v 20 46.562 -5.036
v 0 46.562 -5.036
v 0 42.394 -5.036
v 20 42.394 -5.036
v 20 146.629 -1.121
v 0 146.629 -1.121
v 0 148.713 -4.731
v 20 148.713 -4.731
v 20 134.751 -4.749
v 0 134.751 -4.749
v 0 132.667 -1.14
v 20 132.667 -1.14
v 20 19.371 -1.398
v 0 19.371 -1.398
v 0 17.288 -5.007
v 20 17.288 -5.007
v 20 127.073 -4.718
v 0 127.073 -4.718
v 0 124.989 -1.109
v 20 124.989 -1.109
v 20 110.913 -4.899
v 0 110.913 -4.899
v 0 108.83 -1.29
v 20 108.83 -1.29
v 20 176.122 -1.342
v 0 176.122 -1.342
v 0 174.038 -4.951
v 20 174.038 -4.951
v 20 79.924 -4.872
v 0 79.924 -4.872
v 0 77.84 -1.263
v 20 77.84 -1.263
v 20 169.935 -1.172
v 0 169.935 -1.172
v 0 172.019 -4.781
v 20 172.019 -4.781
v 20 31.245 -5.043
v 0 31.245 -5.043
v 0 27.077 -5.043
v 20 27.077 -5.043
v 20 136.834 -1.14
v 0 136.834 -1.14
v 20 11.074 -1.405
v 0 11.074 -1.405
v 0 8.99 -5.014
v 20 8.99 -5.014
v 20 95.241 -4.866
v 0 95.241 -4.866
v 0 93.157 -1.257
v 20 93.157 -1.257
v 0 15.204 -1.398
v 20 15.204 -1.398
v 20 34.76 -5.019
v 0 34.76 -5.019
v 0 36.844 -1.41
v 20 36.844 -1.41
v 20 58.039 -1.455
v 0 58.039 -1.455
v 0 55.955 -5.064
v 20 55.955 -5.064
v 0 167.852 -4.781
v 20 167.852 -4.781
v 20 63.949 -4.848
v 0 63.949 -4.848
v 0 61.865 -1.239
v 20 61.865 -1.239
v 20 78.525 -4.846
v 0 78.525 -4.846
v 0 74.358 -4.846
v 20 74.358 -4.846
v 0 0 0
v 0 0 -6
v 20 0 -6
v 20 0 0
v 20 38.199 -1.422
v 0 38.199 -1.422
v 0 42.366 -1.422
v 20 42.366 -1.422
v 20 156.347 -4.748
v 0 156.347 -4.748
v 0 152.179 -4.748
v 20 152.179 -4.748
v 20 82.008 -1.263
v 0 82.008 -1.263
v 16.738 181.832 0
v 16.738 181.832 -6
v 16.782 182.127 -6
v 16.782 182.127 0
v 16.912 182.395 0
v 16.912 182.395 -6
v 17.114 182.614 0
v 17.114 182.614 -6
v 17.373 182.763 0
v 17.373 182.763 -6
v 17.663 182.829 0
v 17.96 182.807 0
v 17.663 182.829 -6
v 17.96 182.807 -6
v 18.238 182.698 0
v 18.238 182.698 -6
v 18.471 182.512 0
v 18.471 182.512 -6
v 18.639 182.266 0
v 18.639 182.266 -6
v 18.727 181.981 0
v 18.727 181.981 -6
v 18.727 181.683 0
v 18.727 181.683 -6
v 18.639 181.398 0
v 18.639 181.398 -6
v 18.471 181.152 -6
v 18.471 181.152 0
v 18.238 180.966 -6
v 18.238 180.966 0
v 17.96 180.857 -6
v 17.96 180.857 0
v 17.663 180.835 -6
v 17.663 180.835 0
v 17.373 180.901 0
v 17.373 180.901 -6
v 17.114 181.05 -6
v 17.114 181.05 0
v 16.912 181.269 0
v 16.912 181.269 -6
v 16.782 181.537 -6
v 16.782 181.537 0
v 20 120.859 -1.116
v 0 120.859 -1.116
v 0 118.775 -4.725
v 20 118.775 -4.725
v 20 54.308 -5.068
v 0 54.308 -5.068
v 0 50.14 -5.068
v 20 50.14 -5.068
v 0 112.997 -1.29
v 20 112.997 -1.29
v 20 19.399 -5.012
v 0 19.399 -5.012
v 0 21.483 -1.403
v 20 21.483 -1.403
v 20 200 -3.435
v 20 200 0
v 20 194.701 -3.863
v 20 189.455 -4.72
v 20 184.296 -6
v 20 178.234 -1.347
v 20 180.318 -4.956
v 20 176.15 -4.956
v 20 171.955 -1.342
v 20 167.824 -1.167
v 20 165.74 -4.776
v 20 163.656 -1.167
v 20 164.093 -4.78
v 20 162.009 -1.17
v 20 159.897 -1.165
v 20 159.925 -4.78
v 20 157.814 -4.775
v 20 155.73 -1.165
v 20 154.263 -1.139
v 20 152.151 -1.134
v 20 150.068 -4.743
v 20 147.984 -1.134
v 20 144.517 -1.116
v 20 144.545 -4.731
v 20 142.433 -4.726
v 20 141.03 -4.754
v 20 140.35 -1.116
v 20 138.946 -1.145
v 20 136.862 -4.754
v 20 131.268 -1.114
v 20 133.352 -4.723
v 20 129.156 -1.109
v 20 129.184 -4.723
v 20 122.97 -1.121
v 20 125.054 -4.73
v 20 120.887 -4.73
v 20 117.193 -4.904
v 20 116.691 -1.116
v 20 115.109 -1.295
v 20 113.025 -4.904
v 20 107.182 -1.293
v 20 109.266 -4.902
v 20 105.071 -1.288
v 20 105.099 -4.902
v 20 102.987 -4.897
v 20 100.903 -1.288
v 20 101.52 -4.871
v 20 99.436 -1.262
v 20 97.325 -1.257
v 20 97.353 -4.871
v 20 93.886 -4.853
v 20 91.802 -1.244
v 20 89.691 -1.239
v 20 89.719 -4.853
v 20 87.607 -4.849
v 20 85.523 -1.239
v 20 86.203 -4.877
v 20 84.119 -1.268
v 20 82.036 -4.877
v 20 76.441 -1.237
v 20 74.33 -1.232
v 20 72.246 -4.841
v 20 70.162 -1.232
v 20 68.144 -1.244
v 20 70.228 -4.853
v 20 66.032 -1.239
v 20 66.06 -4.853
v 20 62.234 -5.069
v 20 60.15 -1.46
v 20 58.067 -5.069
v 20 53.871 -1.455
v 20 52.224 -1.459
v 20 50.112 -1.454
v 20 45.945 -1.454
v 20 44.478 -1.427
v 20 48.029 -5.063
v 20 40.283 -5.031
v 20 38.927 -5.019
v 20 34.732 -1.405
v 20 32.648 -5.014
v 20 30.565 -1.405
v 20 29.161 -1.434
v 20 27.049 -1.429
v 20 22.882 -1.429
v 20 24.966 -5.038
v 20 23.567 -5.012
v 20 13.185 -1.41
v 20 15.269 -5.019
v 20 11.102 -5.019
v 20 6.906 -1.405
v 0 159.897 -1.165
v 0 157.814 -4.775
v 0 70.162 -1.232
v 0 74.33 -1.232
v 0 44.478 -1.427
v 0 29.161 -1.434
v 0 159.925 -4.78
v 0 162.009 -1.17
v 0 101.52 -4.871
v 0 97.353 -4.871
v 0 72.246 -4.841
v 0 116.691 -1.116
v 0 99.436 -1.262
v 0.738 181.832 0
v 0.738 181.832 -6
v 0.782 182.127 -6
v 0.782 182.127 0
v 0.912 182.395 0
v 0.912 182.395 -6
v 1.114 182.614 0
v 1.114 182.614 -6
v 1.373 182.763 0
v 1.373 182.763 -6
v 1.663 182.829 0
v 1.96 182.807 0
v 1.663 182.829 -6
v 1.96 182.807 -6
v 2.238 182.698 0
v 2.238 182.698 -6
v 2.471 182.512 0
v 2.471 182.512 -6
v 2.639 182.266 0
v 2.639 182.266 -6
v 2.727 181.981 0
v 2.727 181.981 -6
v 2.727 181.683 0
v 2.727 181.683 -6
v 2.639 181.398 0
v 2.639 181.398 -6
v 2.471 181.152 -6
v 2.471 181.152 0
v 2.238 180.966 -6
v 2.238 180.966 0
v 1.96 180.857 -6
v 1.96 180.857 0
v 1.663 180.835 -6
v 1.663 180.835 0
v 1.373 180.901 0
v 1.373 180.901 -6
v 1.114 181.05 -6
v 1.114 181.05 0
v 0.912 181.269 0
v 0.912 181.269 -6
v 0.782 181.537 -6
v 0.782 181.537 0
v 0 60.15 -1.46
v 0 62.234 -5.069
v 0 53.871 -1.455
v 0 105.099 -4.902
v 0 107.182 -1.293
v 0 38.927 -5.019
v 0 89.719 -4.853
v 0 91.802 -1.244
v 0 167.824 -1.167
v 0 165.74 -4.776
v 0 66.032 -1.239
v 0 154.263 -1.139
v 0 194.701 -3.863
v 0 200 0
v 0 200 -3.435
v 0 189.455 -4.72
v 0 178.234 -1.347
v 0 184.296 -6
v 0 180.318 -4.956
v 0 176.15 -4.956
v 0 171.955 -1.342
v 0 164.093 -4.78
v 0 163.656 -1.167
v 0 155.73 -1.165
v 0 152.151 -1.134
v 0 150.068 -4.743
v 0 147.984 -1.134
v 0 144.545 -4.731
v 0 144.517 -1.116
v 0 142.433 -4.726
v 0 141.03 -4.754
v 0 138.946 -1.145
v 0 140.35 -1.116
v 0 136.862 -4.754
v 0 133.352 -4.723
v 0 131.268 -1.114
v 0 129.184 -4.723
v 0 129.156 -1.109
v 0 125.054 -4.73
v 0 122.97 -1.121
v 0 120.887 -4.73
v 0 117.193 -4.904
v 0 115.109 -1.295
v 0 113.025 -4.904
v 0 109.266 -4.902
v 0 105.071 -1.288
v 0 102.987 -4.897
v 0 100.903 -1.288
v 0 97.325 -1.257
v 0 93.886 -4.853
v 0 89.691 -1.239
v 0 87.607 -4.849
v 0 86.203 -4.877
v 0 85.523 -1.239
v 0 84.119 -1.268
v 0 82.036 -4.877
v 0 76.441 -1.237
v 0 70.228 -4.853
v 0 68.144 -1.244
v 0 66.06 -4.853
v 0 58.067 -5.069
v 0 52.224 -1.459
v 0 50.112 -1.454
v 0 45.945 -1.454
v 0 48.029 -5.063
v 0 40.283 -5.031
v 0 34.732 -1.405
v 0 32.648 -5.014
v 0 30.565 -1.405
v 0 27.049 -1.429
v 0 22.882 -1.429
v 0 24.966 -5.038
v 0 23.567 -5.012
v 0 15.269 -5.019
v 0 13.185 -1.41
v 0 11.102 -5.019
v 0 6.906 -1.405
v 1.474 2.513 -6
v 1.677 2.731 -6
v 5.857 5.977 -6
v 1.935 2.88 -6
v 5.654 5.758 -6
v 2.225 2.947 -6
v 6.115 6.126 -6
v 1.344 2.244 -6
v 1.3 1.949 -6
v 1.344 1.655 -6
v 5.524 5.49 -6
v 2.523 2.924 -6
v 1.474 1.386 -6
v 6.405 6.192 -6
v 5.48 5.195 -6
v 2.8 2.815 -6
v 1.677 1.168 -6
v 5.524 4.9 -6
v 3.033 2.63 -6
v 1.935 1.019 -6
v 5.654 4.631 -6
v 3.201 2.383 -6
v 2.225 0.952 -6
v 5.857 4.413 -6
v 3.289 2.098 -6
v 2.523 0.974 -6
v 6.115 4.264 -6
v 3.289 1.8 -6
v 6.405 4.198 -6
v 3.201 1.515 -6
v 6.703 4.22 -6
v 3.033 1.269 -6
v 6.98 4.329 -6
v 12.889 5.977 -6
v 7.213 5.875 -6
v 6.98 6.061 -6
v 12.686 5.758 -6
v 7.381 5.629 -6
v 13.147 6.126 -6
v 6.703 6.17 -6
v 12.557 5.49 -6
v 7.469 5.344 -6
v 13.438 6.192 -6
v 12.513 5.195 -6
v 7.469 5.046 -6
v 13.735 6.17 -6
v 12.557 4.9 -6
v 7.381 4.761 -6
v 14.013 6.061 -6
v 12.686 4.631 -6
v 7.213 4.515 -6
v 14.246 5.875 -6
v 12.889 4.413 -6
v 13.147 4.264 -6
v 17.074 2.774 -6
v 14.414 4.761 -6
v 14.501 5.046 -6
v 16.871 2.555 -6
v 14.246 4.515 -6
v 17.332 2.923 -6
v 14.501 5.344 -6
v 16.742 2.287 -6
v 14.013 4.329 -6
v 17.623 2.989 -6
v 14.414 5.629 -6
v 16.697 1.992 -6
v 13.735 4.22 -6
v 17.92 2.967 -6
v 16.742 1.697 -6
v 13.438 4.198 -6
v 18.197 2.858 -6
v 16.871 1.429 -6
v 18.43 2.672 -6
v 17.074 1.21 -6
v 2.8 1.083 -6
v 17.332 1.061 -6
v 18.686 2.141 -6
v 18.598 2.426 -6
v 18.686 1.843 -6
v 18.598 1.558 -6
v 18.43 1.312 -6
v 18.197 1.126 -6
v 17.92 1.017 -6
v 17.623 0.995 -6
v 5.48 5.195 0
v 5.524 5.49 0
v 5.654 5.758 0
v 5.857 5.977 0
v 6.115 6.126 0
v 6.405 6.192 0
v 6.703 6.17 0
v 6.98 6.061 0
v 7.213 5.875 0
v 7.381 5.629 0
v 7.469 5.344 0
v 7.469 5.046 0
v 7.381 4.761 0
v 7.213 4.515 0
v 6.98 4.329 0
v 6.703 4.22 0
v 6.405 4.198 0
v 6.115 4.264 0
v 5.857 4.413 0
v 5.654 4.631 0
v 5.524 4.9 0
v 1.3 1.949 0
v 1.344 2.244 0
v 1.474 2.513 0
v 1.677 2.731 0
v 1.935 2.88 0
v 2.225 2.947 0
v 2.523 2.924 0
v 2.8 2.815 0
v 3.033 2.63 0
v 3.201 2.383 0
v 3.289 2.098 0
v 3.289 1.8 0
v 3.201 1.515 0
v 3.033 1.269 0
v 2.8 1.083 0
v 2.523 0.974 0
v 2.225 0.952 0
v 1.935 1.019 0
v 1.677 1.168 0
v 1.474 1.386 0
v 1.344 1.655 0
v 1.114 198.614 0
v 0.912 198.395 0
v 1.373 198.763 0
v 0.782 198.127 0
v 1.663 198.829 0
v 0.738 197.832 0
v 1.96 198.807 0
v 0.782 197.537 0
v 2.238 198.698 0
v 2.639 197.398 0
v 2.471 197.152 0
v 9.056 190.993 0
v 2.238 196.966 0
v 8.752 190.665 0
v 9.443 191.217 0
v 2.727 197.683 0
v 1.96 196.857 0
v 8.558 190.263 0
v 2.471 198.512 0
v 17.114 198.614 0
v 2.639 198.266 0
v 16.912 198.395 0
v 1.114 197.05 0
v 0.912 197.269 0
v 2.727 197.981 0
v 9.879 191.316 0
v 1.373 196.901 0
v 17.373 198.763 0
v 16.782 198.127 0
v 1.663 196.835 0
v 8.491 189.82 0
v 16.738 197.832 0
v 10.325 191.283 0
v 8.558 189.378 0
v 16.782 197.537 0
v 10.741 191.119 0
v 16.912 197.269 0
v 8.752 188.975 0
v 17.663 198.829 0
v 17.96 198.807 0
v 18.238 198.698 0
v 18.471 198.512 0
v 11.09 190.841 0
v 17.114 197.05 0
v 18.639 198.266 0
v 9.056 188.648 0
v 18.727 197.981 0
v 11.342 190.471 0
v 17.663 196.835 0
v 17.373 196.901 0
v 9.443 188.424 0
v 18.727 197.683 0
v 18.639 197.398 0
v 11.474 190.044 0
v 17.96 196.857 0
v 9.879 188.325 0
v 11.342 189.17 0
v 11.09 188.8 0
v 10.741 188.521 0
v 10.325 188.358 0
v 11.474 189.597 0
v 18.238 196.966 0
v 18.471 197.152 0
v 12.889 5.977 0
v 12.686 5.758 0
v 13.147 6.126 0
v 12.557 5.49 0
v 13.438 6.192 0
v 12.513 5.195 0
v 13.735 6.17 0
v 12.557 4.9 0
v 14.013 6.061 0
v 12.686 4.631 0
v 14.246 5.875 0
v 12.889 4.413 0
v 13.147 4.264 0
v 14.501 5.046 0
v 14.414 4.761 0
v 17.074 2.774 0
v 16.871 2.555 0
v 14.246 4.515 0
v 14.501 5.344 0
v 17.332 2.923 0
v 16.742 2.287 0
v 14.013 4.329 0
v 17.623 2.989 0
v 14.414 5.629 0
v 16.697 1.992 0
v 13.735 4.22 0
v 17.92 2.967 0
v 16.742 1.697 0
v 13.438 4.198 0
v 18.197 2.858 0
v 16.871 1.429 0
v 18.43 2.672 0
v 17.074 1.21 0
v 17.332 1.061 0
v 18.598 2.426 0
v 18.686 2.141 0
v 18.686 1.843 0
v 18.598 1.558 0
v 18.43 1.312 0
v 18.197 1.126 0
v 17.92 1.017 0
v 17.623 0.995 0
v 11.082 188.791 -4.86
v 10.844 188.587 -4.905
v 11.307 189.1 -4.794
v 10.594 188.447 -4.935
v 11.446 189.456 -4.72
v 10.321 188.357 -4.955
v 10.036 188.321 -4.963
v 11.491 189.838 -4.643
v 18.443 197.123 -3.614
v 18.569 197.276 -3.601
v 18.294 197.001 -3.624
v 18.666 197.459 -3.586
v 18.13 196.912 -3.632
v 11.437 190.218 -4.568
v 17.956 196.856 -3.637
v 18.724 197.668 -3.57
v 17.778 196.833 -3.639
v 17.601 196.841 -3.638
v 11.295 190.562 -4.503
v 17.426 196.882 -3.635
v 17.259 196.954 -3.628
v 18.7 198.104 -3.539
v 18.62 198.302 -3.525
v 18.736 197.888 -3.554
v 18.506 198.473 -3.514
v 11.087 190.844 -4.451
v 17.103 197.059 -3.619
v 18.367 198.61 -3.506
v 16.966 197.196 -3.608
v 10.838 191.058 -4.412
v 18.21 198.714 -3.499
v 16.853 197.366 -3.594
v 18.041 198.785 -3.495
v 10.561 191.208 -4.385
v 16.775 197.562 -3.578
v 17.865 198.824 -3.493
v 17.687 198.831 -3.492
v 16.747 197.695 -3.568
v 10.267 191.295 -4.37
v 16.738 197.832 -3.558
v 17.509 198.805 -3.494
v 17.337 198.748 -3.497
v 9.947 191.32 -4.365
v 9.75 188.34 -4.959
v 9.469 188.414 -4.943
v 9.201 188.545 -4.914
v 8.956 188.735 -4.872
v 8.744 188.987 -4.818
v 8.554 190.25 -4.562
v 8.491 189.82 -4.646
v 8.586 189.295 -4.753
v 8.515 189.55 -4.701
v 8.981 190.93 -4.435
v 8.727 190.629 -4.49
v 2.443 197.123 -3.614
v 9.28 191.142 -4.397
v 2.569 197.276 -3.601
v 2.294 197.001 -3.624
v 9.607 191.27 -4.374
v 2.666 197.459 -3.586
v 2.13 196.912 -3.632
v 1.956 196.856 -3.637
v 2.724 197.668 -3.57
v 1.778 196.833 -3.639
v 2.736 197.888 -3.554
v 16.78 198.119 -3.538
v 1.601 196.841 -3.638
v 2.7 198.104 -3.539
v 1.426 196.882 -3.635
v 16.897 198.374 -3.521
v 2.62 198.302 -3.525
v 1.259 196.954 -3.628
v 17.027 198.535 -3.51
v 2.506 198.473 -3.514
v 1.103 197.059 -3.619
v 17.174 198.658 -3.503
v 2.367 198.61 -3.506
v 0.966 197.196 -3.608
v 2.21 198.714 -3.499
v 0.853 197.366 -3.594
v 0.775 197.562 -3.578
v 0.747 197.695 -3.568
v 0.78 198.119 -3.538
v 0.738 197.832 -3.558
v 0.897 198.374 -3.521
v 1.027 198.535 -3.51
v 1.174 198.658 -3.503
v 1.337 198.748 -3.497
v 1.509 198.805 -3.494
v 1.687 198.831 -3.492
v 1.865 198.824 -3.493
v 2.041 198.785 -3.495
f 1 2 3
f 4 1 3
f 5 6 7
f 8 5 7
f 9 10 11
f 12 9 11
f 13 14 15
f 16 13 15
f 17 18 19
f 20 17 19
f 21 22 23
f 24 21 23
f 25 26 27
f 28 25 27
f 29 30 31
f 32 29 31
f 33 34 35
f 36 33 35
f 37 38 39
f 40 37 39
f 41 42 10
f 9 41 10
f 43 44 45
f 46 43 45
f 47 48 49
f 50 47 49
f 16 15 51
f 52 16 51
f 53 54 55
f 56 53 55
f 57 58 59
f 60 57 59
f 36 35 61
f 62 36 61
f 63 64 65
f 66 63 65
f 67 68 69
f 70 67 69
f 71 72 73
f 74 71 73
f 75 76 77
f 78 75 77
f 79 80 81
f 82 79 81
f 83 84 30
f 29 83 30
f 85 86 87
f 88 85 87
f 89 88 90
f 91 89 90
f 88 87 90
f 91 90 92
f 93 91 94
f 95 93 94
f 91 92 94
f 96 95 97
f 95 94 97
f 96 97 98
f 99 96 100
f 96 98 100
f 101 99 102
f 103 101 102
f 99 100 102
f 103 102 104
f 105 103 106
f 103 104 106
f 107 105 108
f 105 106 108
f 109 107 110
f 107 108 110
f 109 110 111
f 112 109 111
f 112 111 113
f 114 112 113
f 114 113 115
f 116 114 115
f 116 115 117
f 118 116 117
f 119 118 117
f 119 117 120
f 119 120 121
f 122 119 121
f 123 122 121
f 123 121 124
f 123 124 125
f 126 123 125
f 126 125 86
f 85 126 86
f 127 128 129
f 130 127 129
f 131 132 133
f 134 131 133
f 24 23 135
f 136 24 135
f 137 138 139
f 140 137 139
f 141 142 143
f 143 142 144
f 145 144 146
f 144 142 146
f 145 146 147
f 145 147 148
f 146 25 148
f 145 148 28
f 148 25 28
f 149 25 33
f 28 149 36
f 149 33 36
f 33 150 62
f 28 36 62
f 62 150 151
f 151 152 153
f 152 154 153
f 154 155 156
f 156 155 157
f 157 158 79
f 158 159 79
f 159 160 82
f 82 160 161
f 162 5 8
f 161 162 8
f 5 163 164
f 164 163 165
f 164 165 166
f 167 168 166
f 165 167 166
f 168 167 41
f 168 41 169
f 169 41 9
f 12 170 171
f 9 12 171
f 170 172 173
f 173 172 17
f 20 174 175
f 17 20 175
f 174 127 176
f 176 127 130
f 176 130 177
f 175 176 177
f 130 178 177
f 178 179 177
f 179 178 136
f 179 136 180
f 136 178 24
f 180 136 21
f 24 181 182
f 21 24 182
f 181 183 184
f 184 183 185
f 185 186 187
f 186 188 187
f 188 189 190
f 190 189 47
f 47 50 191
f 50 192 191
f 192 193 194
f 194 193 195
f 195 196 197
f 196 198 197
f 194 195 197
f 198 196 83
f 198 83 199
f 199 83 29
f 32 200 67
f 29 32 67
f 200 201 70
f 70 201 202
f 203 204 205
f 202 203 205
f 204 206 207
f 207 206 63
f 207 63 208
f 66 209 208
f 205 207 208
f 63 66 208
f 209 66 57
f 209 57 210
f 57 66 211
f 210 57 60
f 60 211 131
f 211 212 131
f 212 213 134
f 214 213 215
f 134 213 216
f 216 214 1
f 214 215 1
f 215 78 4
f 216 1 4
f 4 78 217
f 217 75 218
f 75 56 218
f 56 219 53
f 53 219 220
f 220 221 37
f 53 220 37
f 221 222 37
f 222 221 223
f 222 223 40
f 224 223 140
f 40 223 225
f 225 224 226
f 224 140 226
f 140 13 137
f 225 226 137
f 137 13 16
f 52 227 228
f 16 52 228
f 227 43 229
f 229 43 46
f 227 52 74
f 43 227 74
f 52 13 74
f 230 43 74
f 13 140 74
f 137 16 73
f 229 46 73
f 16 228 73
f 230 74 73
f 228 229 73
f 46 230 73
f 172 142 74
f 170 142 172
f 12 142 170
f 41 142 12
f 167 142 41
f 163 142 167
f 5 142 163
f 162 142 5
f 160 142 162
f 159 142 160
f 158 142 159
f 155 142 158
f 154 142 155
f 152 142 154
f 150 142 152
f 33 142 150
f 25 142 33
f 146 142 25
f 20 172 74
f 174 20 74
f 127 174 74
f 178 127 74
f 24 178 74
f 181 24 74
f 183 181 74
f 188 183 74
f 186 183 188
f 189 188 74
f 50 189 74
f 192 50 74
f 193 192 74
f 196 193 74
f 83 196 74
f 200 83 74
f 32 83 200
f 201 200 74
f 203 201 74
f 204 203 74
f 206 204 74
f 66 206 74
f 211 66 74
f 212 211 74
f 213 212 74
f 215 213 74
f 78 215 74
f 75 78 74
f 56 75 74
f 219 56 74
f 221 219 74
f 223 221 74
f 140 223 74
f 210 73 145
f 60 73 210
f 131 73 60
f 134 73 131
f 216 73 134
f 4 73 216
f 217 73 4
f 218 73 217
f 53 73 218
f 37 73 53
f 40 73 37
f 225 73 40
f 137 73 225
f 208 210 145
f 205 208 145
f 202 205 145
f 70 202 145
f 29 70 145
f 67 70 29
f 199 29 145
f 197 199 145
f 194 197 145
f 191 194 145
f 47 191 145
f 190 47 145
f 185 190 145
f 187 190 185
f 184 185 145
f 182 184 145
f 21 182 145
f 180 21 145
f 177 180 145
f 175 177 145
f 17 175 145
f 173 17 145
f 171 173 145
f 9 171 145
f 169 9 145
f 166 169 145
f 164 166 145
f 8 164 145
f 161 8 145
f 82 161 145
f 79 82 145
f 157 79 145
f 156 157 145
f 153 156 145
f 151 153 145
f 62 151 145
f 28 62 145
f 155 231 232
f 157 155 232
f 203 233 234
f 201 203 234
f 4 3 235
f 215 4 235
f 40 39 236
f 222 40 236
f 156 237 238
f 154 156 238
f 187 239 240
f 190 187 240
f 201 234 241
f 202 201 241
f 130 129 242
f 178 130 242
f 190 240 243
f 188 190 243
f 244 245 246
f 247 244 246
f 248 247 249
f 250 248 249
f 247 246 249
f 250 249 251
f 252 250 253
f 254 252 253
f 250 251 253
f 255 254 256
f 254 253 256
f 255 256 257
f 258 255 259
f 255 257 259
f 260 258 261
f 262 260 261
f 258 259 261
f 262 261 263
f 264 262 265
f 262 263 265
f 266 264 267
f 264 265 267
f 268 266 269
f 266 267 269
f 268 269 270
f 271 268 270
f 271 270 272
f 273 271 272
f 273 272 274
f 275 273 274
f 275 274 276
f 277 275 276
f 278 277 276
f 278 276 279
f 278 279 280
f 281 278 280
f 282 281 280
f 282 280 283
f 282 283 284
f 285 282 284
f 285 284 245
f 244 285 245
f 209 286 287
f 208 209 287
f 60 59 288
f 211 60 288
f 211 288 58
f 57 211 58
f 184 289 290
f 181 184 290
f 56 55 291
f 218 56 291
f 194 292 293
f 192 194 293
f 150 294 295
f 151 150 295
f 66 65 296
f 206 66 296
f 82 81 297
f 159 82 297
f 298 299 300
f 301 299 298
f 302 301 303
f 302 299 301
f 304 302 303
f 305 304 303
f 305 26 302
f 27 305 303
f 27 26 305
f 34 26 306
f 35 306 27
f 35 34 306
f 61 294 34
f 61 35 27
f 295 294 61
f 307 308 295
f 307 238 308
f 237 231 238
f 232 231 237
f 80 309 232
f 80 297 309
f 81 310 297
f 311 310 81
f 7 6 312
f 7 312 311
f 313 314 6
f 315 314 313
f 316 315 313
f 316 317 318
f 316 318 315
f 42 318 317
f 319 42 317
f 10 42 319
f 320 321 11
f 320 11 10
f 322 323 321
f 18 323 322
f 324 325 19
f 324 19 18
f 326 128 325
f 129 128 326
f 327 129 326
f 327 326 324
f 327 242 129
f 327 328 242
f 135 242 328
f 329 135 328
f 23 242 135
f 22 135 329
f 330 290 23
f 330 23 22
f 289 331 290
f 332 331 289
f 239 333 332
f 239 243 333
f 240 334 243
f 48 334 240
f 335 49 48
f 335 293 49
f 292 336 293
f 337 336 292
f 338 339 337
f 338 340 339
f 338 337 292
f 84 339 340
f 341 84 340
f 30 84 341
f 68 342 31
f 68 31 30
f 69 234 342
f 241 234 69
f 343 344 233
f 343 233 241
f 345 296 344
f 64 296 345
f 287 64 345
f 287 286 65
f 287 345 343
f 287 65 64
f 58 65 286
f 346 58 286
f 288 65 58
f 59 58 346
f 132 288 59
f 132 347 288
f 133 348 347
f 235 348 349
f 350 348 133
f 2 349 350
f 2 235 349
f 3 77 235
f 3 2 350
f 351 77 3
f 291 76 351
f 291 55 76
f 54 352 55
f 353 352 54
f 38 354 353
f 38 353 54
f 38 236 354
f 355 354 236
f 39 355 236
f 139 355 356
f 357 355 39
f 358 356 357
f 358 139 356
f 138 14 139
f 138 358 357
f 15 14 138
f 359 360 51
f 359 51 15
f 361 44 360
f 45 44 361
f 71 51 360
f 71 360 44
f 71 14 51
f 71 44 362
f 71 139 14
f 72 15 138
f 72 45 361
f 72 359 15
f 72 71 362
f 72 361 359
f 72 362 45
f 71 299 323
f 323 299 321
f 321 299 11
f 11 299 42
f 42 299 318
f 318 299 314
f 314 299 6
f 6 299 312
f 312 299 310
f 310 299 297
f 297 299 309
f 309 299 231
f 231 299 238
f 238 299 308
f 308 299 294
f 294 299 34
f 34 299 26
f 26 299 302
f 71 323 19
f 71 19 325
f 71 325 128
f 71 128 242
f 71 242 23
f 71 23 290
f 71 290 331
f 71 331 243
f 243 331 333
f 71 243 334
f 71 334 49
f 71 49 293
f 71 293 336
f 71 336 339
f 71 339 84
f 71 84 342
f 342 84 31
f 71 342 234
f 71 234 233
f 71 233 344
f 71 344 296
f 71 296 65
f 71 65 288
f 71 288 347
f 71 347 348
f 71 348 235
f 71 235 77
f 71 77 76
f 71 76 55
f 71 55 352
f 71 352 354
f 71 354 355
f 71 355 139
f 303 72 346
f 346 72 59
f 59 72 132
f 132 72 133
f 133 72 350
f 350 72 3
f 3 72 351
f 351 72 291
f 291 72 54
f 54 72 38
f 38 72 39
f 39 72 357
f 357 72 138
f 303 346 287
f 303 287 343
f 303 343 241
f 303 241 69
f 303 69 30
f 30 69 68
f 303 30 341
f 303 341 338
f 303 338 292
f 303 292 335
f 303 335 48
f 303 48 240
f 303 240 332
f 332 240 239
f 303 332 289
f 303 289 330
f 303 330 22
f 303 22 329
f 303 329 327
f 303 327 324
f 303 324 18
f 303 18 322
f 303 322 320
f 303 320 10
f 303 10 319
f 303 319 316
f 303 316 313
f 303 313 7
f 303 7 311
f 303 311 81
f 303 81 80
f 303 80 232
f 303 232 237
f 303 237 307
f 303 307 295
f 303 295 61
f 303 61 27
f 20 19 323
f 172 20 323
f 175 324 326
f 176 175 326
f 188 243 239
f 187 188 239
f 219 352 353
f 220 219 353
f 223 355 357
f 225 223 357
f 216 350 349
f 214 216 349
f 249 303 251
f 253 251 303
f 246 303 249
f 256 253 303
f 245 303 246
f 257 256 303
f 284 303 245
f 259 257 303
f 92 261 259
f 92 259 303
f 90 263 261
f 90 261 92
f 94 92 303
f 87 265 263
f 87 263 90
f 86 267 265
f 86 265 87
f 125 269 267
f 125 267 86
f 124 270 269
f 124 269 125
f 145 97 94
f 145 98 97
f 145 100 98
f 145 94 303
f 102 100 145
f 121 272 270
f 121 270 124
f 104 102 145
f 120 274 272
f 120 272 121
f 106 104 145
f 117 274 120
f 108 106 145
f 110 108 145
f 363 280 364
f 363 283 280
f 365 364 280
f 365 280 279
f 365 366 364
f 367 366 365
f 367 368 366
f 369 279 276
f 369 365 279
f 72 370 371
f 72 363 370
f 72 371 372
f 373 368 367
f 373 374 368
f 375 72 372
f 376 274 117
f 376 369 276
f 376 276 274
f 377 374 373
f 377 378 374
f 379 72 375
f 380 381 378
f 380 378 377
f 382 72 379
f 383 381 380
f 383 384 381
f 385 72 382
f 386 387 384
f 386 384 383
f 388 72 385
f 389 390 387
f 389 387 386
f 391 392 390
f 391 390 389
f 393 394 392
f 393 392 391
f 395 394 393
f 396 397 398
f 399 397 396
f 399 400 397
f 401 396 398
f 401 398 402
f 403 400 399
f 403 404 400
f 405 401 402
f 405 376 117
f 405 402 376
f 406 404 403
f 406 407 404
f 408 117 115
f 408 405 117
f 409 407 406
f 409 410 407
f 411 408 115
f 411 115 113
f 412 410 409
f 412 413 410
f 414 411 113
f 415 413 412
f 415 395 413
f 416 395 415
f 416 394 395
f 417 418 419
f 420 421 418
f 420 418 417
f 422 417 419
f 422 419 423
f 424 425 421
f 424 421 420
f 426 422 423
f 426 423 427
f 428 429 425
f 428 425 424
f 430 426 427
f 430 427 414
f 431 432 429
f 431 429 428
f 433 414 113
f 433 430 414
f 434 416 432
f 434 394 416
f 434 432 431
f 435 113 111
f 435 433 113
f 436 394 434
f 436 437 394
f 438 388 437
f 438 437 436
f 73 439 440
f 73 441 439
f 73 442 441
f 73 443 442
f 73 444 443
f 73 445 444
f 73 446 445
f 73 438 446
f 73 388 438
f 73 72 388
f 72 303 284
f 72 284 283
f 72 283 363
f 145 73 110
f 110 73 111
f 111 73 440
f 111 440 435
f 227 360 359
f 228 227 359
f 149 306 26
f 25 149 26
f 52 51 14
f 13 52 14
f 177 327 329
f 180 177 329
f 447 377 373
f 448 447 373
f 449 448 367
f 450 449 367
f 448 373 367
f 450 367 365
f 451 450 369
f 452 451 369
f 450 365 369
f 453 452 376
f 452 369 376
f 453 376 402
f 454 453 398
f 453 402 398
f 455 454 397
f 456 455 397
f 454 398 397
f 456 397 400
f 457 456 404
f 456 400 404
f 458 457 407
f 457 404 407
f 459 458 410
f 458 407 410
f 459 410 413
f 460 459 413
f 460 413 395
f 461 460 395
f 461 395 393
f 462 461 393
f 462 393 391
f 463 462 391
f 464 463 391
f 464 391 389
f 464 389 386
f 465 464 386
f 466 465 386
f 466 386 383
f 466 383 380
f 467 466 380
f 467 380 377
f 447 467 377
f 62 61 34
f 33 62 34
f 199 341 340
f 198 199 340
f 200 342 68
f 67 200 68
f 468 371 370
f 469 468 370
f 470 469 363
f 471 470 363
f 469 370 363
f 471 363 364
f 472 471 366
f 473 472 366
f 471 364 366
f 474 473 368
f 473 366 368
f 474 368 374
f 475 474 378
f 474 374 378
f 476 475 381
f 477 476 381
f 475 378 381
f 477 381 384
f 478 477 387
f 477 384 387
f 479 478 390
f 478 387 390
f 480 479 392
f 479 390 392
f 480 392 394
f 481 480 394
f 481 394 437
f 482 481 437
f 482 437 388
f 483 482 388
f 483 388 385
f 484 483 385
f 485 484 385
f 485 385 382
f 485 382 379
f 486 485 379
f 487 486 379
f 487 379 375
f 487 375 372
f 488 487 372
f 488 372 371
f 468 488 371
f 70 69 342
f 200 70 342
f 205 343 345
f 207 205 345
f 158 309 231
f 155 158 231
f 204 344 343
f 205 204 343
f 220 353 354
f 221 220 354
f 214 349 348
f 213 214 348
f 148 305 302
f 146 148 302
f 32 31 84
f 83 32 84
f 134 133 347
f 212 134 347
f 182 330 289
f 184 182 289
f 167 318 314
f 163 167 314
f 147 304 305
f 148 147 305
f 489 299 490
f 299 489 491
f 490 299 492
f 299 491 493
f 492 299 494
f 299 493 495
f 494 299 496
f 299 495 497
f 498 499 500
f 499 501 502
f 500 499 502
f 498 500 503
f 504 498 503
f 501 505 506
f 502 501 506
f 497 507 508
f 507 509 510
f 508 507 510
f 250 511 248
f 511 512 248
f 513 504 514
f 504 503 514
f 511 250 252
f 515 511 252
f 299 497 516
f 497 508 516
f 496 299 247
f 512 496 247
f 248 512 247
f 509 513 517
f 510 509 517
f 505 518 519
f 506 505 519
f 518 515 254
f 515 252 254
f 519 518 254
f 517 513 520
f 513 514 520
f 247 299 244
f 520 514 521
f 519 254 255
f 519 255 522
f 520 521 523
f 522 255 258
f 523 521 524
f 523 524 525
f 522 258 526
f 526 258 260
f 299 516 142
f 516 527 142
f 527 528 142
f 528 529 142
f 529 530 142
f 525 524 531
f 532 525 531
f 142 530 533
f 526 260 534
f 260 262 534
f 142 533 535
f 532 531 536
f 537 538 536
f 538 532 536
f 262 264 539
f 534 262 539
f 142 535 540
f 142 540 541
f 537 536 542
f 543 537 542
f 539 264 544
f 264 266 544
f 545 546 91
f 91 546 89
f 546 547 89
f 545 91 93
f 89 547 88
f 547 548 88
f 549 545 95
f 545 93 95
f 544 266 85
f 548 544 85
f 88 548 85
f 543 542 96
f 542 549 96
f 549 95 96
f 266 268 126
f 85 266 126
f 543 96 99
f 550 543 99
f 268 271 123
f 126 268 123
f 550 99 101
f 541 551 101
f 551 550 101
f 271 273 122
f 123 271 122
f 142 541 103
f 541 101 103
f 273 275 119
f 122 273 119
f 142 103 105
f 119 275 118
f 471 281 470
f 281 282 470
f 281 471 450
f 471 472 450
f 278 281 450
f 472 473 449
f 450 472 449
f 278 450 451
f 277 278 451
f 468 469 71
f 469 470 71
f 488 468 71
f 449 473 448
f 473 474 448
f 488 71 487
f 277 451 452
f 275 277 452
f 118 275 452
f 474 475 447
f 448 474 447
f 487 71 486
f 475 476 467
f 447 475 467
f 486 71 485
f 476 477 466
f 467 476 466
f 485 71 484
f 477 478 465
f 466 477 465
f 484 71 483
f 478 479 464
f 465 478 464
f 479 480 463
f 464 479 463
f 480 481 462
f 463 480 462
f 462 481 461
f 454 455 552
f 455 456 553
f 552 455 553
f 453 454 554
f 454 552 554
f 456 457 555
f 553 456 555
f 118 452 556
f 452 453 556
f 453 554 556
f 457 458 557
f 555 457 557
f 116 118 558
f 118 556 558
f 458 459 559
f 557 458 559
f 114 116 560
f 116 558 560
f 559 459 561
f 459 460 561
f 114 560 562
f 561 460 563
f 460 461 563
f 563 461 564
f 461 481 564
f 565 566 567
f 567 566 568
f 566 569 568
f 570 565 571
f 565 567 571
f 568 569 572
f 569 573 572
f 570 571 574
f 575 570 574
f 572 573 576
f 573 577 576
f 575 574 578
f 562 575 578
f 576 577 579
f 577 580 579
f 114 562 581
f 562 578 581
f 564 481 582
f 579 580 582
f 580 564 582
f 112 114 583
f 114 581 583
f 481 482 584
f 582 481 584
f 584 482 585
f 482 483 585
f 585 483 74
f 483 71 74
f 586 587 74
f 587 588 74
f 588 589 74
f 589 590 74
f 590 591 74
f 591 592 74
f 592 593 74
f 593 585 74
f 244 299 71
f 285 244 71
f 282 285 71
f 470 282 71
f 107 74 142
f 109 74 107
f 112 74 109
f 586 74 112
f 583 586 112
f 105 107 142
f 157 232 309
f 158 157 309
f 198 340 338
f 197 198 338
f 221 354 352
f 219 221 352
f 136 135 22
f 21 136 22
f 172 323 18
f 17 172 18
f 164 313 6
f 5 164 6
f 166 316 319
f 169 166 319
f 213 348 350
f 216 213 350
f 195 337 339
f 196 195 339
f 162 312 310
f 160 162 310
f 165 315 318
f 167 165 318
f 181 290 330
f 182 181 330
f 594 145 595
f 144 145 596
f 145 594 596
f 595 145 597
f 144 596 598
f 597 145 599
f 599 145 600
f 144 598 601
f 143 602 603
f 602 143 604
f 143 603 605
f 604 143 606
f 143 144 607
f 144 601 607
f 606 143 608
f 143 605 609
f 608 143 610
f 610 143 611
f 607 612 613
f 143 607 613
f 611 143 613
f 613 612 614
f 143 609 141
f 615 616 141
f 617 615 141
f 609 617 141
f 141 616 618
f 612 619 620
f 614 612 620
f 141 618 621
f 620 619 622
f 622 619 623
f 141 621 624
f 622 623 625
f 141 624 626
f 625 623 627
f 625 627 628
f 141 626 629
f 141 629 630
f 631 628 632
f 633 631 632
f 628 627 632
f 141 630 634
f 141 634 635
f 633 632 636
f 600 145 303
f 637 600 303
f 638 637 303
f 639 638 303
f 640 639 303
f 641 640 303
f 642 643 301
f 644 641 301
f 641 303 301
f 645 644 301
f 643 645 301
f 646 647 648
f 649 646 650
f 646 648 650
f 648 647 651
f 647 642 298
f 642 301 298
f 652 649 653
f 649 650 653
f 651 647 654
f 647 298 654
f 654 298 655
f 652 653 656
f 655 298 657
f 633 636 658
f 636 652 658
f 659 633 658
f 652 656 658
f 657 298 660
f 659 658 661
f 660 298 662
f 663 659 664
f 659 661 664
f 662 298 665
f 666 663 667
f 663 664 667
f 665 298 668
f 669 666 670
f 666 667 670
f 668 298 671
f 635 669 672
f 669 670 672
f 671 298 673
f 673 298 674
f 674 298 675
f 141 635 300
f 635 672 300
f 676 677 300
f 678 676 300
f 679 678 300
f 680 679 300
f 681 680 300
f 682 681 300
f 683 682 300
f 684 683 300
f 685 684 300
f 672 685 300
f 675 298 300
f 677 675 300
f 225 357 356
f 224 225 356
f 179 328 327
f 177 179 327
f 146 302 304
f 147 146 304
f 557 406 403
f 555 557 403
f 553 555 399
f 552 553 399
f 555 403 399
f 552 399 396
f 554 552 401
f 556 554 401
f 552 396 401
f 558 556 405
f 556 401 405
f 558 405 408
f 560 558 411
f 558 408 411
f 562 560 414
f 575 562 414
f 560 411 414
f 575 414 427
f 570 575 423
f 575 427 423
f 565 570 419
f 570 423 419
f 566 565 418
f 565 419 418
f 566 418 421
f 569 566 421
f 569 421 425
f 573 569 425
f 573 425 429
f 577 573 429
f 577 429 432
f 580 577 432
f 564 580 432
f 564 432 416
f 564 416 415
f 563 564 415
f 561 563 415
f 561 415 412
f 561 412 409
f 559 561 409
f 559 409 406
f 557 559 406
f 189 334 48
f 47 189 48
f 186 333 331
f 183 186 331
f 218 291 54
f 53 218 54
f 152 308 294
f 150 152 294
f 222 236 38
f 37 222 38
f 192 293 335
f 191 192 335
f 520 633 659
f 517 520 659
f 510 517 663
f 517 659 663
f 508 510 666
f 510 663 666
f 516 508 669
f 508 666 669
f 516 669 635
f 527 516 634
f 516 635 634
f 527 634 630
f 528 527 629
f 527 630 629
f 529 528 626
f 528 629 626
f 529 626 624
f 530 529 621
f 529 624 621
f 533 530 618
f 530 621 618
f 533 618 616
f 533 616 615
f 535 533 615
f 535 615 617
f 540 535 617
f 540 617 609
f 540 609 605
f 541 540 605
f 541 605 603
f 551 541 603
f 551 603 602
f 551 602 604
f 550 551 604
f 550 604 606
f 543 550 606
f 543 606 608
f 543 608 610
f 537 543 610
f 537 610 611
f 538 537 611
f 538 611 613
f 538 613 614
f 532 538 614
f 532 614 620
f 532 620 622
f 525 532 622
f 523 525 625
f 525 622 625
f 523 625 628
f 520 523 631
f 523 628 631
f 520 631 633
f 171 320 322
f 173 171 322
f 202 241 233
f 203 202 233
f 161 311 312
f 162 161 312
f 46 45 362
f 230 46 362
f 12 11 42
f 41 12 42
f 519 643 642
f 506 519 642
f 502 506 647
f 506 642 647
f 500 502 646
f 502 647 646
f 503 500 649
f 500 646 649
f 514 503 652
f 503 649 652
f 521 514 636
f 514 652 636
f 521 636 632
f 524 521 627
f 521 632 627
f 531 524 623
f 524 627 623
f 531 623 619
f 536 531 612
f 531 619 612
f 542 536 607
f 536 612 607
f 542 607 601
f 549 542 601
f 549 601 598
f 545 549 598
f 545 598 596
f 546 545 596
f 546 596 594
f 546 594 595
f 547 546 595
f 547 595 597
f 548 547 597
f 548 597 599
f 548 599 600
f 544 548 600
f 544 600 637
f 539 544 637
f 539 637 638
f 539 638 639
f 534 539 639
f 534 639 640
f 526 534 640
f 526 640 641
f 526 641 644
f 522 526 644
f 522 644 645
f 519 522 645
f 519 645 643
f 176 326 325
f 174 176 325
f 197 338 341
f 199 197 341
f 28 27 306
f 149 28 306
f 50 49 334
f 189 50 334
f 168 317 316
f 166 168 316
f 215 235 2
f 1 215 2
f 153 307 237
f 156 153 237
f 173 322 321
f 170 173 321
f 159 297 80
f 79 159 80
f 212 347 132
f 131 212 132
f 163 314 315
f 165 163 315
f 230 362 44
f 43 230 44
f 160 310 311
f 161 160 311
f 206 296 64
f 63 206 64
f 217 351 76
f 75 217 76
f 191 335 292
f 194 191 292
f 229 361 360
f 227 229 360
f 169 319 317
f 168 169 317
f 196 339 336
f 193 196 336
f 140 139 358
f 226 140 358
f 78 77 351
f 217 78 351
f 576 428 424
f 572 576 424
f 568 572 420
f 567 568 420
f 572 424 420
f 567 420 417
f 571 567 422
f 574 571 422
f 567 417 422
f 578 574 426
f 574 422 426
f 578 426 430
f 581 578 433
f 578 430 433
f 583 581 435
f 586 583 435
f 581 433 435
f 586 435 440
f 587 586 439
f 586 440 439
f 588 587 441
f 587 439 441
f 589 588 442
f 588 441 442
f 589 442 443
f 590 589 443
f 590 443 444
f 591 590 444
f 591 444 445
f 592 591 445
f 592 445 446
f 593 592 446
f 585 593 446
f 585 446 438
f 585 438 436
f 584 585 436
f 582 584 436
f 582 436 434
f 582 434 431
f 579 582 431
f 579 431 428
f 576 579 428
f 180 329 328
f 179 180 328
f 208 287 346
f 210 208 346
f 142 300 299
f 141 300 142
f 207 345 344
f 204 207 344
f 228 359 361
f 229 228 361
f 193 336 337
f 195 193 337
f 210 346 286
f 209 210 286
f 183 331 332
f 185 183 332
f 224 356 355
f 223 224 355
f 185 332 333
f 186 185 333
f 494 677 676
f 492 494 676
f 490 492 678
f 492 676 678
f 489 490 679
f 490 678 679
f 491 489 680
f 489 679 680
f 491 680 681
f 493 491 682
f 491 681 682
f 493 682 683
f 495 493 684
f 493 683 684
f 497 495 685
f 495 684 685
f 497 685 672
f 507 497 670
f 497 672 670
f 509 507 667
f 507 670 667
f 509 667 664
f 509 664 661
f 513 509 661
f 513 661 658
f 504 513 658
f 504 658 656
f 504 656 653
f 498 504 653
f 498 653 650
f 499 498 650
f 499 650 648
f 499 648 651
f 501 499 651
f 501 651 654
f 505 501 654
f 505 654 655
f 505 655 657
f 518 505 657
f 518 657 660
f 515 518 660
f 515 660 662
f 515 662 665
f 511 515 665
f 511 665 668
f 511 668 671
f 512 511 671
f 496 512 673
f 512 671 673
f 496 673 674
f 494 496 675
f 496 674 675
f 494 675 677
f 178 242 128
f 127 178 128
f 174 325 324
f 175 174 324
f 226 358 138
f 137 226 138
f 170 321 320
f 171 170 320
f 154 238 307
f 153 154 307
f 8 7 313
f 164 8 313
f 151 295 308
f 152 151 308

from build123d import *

# Parameters (mm, degrees)
SKETCH3_W           = 20
SKETCH3_H           = 6
BOSS_EXTRUDE1_DEPTH = 200
SKETCH7_R           = 1
SKETCH7_R_2         = 1.5
CUT_EXTRUDE1_DEPTH  = 200
CUT_EXTRUDE2_DEPTH  = 20


with BuildPart() as part:
    # Sketch3 → Boss-Extrude1 (new body)
    with BuildSketch(Plane(origin=(0, 0, 0), x_dir=(1, 0, 0), z_dir=(0, 1, 0))):
        with Locations((10, 3)):
            Rectangle(SKETCH3_W, SKETCH3_H)
    extrude(amount=BOSS_EXTRUDE1_DEPTH)

    # Sketch7 → Cut-Extrude1 (cut)
    with BuildSketch(Plane(origin=(0, 0, -6), x_dir=(-1, 0, 0), z_dir=(0, 0, -1))):
        with Locations((-17.73786558, 197.831954878)):
            Circle(SKETCH7_R)
        with Locations((-9.990864499, 189.820422053)):
            Circle(SKETCH7_R_2)
        with Locations((-1.73786558, 181.831954878)):
            Circle(SKETCH7_R)
        with Locations((-17.73786558, 181.831954878)):
            Circle(SKETCH7_R)
        with Locations((-1.73786558, 197.831954878)):
            Circle(SKETCH7_R)
        with Locations((-17.697443934, 1.992082172)):
            Circle(SKETCH7_R)
        with Locations((-13.512620359, 5.194753276)):
            Circle(SKETCH7_R)
        with Locations((-6.48, 5.194753276)):
            Circle(SKETCH7_R)
        with Locations((-2.3, 1.949379891)):
            Circle(SKETCH7_R)
    extrude(amount=-CUT_EXTRUDE1_DEPTH, mode=Mode.SUBTRACT)

    # Sketch8 → Cut-Extrude2 (cut)
    with BuildSketch(Plane.ZY):
        with BuildLine():
            Line((-3.435173621, 200.001787597), (-6.052585671, 200.001787597))
            Line((-6.052585671, 200.001787597), (-6.052585671, 184.116303831))
            ThreePointArc((-6.052585671, 184.116303831), (-4.253368373, 191.978225379), (-3.435173621, 200.001787597))
        make_face()
        Polygon((-5.013852098, 8.990026394), (-1.404702024, 6.906282628), (-1.404702024, 11.073770161), align=None)
        Polygon((-1.409675828, 13.185368824), (-5.018825902, 15.269112591), (-5.018825902, 11.101625057), align=None)
        Polygon((-5.006834199, 17.287599614), (-1.397684125, 15.203855847), (-1.397684125, 19.371343381), align=None)
        Polygon((-1.40265793, 21.482942044), (-5.011808004, 23.566685811), (-5.011808004, 19.399198277), align=None)
        Polygon((-4.848372599, 63.948540489), (-1.239222525, 61.864796722), (-1.239222525, 66.032284256), align=None)
        Polygon((-1.24419633, 68.143882919), (-4.853346404, 70.227626686), (-4.853346404, 66.060139152), align=None)
        Polygon((-5.03782653, 24.96562567), (-1.428676456, 22.881881903), (-1.428676456, 27.049369437), align=None)
        Polygon((-1.433650261, 29.1609681), (-5.042800335, 31.244711867), (-5.042800335, 27.077224333), align=None)
        Polygon((-5.013997563, 32.648394903), (-1.404847489, 30.564651136), (-1.404847489, 34.73213867), align=None)
        Polygon((-1.409821293, 36.843737333), (-5.018971367, 38.927481099), (-5.018971367, 34.759993566), align=None)
        Polygon((-5.031499061, 40.282604028), (-1.422348987, 38.198860261), (-1.422348987, 42.366347795), align=None)
        Polygon((-1.427322791, 44.477946458), (-5.036472865, 46.561690225), (-5.036472865, 42.394202691), align=None)
        Polygon((-5.062933803, 48.028503916), (-1.453783729, 45.944760149), (-1.453783729, 50.112247683), align=None)
        Polygon((-1.458757534, 52.223846346), (-5.067907608, 54.307590112), (-5.067907608, 50.140102579), align=None)
        Polygon((-5.064343036, 55.954978053), (-1.455192962, 53.871234286), (-1.455192962, 58.03872182), align=None)
        Polygon((-1.460166767, 60.150320483), (-5.069316841, 62.23406425), (-5.069316841, 58.066576716), align=None)
        Polygon((-4.841354701, 72.246113708), (-1.232204627, 70.162369942), (-1.232204627, 74.329857475), align=None)
        Polygon((-1.237178431, 76.441456138), (-4.846328505, 78.525199905), (-4.846328505, 74.357712372), align=None)
        Polygon((-4.872347032, 79.924139765), (-1.263196958, 77.840395998), (-1.263196958, 82.007883531), align=None)
        Polygon((-1.268170762, 84.119482194), (-4.877320836, 86.203225961), (-4.877320836, 82.035738428), align=None)
        Polygon((-4.848518064, 87.606908997), (-1.23936799, 85.523165231), (-1.23936799, 89.690652764), align=None)
        Polygon((-1.244341795, 91.802251427), (-4.853491869, 93.885995194), (-4.853491869, 89.71850766), align=None)
        Polygon((-4.866019563, 95.241118123), (-1.256869489, 93.157374356), (-1.256869489, 97.324861889), align=None)
        Polygon((-1.261843293, 99.436460552), (-4.870993367, 101.520204319), (-4.870993367, 97.352716786), align=None)
        Polygon((-4.897454305, 102.98701801), (-1.288304231, 100.903274244), (-1.288304231, 105.070761777), align=None)
        Polygon((-1.293278035, 107.18236044), (-4.902428109, 109.266104207), (-4.902428109, 105.098616674), align=None)
        Polygon((-4.898863538, 110.913492147), (-1.289713464, 108.829748381), (-1.289713464, 112.997235914), align=None)
        Polygon((-1.294687269, 115.108834577), (-4.903837343, 117.192578344), (-4.903837343, 113.025090811), align=None)
        Polygon((-4.725469308, 118.775061554), (-1.116319234, 116.691317787), (-1.116319234, 120.858805321), align=None)
        Polygon((-1.121293038, 122.970403984), (-4.730443112, 125.05414775), (-4.730443112, 120.886660217), align=None)
        Polygon((-4.71845141, 127.072634773), (-1.109301336, 124.988891007), (-1.109301336, 129.15637854), align=None)
        Polygon((-1.11427514, 131.267977203), (-4.723425214, 133.35172097), (-4.723425214, 129.184233436), align=None)
        Polygon((-4.749443741, 134.750660829), (-1.140293667, 132.666917063), (-1.140293667, 136.834404596), align=None)
        Polygon((-1.145267471, 138.946003259), (-4.754417545, 141.029747026), (-4.754417545, 136.862259493), align=None)
        Polygon((-4.725614773, 142.433430062), (-1.116464699, 140.349686295), (-1.116464699, 144.517173829), align=None)
        Polygon((-1.121438503, 146.628772492), (-4.730588577, 148.712516259), (-4.730588577, 144.545028725), align=None)
        Polygon((-4.743116271, 150.067639187), (-1.133966197, 147.983895421), (-1.133966197, 152.151382954), align=None)
        Polygon((-1.138940002, 154.262981617), (-4.748090076, 156.346725384), (-4.748090076, 152.179237851), align=None)
        Polygon((-4.774551014, 157.813539075), (-1.16540094, 155.729795309), (-1.16540094, 159.897282842), align=None)
        Polygon((-1.170374744, 162.008881505), (-4.779524818, 164.092625272), (-4.779524818, 159.925137738), align=None)
        Polygon((-4.775960247, 165.740013212), (-1.166810173, 163.656269446), (-1.166810173, 167.823756979), align=None)
        Polygon((-1.171783977, 169.935355642), (-4.780934051, 172.019099409), (-4.780934051, 167.851611875), align=None)
        Polygon((-4.95123506, 174.038440061), (-1.342084986, 171.954696294), (-1.342084986, 176.122183828), align=None)
        Polygon((-1.34705879, 178.233782491), (-4.956208864, 180.317526258), (-4.956208864, 176.150038724), align=None)
    extrude(amount=-CUT_EXTRUDE2_DEPTH, mode=Mode.SUBTRACT)


solid = part.part
